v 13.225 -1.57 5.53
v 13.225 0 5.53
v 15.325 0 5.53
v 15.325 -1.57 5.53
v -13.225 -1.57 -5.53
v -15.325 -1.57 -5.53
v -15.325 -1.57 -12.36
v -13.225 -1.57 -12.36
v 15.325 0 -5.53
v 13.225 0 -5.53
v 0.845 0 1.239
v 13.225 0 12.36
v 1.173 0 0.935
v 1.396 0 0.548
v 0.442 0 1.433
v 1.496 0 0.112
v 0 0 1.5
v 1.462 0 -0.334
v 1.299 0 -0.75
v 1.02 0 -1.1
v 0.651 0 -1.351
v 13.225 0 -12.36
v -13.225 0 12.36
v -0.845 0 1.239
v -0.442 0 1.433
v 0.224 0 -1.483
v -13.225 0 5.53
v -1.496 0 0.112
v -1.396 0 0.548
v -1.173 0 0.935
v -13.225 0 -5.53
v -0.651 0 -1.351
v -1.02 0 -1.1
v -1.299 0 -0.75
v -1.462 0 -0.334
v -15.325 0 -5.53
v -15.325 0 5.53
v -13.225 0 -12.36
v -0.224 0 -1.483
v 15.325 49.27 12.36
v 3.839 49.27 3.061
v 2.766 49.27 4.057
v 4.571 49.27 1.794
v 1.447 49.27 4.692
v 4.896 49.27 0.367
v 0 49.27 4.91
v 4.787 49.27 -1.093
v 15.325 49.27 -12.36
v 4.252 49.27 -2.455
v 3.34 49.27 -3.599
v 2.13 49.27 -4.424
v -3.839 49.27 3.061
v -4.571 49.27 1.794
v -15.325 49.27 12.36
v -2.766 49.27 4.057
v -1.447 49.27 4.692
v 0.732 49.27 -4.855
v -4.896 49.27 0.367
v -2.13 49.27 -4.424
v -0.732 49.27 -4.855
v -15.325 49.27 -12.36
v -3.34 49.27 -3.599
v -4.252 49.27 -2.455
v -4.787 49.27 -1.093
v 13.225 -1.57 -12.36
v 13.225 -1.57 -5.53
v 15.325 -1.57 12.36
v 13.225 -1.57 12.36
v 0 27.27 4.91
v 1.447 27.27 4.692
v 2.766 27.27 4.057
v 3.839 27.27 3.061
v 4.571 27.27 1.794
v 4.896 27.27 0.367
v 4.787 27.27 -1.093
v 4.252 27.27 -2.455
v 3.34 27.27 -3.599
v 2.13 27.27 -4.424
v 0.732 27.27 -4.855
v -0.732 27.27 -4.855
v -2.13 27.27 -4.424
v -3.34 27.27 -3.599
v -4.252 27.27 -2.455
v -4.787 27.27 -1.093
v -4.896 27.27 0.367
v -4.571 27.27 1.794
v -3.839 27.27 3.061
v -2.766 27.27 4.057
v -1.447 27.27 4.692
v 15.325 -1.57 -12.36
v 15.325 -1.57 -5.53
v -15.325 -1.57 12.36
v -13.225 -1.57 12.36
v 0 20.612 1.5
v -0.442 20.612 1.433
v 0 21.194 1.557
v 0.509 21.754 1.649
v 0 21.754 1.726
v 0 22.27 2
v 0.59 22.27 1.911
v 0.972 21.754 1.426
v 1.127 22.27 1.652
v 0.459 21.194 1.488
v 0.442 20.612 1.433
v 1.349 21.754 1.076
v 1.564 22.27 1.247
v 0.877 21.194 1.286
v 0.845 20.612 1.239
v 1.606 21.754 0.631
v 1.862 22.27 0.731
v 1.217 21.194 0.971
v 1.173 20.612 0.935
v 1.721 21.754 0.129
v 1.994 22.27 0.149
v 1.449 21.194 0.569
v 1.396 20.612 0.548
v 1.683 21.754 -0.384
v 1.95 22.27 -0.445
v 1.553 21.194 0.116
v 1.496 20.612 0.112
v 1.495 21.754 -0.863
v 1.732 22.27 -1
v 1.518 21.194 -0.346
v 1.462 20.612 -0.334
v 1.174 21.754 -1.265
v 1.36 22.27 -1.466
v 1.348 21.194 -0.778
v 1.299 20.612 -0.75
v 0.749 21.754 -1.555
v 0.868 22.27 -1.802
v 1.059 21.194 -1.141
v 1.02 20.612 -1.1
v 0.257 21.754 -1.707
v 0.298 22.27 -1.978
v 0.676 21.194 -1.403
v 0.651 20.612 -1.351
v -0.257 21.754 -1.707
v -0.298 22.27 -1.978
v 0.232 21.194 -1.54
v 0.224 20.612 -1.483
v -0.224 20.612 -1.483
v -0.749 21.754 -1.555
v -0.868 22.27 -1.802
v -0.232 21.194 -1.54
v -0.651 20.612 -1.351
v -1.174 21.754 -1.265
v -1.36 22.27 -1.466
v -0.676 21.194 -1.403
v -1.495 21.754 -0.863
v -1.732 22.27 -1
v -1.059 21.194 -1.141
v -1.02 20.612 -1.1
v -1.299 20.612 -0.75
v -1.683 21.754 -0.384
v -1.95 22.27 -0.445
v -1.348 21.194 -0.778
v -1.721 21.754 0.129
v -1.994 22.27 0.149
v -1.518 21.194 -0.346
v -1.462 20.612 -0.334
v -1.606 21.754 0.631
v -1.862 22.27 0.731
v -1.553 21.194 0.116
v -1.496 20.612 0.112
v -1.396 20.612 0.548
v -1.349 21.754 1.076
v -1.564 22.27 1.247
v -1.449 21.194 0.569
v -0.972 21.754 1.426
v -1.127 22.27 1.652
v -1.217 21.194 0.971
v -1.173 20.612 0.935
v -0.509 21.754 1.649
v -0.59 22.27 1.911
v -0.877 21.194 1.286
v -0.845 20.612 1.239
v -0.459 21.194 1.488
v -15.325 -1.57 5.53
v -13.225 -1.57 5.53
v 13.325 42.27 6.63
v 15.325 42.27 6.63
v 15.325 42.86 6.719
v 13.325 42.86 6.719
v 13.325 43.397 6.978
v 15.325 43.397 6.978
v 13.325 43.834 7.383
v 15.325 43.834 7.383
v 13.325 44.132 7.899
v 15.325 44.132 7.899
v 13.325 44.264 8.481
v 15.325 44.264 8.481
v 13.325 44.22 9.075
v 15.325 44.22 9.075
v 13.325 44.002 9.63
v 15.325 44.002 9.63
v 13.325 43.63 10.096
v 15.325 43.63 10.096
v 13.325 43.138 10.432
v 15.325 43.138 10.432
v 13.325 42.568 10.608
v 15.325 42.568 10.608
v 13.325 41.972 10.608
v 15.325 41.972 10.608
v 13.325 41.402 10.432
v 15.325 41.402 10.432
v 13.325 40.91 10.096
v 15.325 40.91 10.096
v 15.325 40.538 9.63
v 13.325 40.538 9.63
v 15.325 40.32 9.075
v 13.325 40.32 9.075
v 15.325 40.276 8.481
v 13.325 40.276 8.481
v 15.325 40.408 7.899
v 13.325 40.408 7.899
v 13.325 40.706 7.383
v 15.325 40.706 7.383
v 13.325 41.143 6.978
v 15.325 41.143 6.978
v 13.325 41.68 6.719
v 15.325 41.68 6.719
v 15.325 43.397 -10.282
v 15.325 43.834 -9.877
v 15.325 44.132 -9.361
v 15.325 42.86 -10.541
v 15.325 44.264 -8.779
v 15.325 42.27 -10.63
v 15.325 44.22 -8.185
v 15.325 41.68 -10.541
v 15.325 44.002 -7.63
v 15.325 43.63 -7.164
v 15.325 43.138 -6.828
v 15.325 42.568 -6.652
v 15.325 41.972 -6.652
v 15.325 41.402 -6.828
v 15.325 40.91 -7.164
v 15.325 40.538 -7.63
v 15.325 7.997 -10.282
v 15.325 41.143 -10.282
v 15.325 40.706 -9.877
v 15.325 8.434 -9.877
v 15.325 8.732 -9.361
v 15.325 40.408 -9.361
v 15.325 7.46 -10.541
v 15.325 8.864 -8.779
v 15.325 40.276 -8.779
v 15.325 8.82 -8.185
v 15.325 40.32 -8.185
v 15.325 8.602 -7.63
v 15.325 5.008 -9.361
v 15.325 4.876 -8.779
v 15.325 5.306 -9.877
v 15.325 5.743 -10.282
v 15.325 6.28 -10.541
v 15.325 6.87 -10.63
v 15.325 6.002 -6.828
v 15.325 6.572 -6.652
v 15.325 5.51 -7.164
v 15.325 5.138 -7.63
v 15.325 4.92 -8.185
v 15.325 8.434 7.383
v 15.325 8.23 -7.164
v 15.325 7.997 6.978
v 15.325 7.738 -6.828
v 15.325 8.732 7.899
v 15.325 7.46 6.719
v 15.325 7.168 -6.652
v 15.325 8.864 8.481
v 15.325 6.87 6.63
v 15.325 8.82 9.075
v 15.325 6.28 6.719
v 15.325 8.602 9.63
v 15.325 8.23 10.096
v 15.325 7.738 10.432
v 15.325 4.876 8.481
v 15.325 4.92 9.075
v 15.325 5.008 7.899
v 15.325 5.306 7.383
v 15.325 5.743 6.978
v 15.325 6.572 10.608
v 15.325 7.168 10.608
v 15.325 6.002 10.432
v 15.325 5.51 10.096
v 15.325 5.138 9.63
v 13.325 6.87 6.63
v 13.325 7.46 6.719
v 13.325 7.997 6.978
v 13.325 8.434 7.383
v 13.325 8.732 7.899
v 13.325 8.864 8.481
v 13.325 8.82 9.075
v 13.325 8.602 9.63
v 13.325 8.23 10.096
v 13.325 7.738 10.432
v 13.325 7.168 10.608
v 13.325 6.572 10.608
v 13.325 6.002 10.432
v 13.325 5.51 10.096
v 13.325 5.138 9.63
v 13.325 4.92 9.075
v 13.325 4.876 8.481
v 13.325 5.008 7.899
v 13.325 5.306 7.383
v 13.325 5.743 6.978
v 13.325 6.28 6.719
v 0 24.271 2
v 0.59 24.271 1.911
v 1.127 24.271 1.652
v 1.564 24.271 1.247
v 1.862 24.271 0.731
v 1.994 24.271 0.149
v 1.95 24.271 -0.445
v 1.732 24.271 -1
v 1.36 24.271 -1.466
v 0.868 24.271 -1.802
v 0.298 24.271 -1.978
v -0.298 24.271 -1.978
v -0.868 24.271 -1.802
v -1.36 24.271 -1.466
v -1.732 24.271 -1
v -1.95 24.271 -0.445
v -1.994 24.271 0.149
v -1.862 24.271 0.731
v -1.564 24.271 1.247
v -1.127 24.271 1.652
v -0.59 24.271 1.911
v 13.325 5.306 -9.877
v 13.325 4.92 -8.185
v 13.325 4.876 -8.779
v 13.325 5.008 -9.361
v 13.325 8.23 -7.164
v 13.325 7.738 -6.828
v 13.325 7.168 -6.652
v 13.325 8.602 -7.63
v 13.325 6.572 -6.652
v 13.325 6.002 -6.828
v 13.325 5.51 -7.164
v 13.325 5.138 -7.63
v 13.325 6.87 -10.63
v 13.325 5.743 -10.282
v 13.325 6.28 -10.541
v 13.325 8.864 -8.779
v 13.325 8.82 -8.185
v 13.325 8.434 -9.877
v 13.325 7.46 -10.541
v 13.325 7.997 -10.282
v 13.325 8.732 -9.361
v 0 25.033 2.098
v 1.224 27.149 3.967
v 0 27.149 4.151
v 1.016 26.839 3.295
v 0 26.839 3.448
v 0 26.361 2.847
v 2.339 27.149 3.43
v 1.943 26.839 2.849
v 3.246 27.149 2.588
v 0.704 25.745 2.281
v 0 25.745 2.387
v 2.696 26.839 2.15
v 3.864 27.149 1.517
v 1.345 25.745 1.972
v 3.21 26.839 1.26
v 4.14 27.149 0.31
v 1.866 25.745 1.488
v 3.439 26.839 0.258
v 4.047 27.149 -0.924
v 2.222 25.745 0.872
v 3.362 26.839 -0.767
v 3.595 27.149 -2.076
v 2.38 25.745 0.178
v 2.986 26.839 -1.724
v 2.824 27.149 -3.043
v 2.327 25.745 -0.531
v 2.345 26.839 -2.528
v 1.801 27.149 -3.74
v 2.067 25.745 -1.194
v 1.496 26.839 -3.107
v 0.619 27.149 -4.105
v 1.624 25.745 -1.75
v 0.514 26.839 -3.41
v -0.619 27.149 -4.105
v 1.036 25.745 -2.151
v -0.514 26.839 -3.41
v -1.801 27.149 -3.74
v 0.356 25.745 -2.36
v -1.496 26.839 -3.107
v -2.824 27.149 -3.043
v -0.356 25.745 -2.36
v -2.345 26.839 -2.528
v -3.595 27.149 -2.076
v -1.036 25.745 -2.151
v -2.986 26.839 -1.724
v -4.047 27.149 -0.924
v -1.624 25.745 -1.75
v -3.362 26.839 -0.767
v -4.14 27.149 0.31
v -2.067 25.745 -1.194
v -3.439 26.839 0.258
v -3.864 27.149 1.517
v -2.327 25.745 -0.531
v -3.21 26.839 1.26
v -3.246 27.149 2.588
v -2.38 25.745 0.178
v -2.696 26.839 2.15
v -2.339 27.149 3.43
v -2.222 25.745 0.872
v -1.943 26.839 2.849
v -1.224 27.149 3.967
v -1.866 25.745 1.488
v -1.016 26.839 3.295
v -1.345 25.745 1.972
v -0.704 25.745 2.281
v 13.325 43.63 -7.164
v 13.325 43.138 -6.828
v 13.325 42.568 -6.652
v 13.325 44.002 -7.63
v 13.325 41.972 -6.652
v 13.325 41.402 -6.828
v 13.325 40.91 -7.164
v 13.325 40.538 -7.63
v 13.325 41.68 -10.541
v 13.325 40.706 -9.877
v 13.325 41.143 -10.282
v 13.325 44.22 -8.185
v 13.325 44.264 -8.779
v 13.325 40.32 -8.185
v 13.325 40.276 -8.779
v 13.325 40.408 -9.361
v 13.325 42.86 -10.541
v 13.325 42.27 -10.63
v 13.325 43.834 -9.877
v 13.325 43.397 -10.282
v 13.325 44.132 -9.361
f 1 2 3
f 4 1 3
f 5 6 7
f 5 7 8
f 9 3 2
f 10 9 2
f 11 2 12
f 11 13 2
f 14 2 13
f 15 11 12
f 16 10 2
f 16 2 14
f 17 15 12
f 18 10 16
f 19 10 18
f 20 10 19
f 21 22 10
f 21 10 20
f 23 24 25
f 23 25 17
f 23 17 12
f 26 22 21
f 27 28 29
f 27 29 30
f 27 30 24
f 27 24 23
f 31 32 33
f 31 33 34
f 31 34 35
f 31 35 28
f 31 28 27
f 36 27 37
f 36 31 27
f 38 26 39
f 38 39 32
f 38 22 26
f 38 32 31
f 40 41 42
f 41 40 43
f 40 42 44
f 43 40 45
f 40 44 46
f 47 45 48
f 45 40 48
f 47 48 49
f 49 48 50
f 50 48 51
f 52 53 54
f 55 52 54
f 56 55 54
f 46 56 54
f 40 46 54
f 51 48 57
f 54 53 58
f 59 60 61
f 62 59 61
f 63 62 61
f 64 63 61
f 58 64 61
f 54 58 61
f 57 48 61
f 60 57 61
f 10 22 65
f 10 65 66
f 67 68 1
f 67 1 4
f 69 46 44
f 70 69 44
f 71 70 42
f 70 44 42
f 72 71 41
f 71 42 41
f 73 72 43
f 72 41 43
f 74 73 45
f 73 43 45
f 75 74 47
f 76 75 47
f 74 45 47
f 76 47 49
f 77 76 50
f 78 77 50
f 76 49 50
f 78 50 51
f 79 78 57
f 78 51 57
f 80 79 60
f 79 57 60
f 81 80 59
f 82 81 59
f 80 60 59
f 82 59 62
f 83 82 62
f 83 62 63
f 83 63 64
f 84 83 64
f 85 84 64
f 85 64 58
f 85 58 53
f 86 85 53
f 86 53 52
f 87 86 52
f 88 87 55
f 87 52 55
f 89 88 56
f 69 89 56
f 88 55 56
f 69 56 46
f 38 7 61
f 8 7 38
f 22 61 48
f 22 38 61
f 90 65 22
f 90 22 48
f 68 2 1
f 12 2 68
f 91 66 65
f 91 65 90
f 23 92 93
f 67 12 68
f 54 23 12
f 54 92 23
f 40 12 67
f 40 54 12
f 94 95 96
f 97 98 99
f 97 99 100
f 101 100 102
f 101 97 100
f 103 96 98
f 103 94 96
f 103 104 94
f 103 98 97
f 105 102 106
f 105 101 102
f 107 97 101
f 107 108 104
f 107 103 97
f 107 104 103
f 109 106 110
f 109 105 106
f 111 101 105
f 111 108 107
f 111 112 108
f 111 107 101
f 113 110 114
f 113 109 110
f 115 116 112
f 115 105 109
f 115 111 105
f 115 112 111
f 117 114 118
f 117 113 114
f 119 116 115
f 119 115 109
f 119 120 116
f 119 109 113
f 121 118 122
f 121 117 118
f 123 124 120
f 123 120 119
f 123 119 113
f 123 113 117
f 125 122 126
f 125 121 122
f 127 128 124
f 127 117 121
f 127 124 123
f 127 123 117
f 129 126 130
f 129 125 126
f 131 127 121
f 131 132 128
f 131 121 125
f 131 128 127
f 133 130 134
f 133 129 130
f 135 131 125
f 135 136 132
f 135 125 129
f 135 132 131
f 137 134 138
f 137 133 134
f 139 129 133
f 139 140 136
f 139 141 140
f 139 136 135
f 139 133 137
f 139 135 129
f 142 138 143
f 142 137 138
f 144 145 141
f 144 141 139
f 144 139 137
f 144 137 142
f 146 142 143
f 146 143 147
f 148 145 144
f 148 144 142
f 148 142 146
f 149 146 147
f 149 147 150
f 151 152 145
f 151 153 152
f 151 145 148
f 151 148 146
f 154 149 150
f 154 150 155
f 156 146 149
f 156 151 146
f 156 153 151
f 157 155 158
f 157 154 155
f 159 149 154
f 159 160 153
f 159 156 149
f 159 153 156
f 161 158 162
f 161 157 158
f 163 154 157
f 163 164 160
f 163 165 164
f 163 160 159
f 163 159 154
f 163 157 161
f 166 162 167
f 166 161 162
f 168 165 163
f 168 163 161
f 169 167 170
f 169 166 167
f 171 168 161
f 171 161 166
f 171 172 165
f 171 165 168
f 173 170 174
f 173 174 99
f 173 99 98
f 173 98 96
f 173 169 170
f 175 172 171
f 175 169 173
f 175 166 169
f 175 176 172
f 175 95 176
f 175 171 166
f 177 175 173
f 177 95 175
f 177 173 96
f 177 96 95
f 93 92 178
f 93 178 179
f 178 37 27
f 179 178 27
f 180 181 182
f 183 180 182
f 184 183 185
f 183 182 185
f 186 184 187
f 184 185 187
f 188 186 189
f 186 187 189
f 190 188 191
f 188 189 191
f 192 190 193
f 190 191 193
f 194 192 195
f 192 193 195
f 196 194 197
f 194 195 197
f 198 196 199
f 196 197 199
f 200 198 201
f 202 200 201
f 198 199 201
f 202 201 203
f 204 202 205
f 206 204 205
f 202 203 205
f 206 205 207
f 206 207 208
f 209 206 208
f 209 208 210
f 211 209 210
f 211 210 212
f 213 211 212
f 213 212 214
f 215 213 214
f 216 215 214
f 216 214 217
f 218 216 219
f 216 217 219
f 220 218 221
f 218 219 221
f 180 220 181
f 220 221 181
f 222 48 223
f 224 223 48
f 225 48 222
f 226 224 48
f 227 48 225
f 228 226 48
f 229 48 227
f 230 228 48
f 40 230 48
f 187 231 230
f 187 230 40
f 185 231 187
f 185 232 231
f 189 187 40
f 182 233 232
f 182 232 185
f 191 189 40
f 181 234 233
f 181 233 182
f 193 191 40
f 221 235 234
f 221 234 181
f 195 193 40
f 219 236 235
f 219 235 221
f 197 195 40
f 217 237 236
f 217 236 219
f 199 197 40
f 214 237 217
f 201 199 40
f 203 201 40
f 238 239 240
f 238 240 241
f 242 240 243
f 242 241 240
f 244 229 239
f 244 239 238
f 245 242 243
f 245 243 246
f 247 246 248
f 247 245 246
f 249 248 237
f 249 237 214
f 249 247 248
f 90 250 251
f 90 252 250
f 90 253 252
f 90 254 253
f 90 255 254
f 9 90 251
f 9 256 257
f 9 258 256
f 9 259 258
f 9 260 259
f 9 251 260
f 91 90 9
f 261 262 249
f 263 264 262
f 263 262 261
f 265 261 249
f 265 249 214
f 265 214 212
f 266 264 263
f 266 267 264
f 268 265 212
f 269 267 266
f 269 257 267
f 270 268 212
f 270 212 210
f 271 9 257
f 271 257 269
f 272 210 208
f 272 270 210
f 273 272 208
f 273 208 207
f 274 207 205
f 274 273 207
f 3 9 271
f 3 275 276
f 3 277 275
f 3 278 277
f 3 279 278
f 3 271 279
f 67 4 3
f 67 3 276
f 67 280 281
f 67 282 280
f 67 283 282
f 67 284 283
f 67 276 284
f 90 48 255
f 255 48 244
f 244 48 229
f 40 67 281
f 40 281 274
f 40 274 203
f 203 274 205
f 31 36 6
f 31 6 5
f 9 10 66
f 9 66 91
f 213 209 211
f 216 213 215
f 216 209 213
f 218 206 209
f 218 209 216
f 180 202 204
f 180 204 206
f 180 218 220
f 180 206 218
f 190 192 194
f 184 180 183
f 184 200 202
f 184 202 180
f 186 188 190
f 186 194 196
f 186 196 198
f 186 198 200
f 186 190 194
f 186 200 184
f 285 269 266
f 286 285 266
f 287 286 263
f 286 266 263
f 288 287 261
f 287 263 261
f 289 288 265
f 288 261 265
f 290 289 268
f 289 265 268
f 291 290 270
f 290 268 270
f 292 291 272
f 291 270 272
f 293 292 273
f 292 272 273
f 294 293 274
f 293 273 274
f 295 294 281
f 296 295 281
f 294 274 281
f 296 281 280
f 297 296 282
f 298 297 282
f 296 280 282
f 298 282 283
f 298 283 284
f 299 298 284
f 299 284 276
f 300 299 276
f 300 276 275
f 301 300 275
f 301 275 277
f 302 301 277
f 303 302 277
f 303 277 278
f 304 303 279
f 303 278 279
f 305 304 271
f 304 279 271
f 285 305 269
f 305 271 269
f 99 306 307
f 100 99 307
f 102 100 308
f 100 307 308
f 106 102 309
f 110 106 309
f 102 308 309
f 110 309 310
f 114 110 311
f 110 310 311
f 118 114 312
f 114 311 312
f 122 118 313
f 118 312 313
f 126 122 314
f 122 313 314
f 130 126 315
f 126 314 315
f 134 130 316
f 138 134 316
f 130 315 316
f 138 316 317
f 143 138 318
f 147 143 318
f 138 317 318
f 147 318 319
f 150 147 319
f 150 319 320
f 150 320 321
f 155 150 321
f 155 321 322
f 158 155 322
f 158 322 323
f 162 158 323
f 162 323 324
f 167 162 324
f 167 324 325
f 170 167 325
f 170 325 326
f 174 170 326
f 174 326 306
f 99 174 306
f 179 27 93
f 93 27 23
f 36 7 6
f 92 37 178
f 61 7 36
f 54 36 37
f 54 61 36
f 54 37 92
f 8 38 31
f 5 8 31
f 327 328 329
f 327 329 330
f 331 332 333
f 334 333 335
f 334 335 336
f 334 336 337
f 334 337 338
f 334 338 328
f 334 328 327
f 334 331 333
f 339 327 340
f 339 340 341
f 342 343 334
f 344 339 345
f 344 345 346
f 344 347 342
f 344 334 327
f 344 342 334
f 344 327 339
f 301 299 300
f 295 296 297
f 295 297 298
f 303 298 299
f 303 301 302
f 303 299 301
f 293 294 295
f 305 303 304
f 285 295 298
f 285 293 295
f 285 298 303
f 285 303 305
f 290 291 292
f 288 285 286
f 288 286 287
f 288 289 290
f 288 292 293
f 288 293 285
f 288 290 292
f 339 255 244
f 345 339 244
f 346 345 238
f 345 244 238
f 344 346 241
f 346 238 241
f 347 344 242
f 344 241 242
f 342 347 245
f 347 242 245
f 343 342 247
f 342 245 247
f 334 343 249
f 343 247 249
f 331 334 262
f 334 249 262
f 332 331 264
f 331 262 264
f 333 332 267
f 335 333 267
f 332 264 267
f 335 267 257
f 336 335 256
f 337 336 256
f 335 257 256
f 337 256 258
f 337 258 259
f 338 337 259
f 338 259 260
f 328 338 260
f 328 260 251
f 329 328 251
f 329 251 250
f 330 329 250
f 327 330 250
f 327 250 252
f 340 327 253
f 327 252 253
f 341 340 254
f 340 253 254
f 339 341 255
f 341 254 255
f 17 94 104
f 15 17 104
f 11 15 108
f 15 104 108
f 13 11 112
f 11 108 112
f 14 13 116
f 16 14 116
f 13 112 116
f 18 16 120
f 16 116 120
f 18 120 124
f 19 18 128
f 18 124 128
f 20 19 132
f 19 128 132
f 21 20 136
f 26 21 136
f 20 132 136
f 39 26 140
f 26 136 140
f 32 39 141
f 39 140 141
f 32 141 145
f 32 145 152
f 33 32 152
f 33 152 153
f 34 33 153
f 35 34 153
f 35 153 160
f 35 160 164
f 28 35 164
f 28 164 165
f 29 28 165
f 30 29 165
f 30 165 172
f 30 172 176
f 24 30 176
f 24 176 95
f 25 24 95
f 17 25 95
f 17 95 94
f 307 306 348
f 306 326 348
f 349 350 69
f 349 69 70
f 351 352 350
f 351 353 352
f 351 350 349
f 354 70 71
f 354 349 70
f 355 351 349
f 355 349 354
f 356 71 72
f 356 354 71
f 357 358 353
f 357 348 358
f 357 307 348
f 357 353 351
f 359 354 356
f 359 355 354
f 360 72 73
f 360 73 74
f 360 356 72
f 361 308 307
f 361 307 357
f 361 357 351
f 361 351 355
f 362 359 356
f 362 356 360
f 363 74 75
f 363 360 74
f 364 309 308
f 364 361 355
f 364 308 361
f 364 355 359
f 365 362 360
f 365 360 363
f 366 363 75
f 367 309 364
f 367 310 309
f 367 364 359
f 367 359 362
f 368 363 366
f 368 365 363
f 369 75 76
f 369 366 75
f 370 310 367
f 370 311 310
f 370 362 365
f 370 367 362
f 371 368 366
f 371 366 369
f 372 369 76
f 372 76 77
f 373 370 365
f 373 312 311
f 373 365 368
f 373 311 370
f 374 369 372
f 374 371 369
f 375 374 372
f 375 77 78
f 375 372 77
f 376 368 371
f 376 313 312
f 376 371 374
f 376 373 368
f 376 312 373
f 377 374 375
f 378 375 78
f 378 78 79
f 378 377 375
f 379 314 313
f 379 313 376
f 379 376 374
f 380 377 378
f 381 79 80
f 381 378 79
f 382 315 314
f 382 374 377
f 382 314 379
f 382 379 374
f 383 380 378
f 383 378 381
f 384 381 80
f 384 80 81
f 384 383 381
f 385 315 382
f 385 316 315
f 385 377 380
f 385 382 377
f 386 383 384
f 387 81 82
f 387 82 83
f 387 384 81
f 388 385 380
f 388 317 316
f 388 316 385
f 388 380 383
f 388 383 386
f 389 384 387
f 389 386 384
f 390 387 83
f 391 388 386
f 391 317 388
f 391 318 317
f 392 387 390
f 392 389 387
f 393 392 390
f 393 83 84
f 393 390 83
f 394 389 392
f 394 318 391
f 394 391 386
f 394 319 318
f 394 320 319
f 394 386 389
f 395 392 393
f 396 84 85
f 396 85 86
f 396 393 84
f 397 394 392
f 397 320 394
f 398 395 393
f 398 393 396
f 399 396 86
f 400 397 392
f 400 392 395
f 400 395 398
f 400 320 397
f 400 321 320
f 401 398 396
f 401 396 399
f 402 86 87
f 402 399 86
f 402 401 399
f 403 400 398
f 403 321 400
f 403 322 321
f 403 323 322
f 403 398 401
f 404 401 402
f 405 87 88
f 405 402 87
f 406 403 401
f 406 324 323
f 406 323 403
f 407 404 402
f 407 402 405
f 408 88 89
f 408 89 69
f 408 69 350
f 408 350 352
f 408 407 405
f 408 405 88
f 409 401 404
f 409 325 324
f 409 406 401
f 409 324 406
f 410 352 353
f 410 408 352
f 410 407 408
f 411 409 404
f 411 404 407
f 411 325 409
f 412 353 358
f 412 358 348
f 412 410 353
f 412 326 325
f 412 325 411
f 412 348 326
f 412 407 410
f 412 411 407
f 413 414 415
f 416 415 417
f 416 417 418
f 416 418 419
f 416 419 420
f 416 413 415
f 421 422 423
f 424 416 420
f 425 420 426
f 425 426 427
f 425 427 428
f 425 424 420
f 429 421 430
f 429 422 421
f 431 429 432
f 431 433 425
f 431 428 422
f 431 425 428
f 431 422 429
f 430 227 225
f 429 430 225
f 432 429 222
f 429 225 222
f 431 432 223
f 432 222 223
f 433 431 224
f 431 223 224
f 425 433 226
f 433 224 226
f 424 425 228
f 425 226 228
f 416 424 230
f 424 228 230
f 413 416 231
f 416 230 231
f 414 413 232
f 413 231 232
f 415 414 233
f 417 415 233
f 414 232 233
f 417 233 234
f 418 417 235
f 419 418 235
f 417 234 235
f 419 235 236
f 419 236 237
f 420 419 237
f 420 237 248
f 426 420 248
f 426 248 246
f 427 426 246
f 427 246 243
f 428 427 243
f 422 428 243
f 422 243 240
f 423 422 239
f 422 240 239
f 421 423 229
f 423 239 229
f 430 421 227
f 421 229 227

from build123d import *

# Parameters (mm, degrees)
BOSS_EXTRUDE1_DEPTH = 49.27
SKETCH12_W          = 2.099999999999998
SKETCH12_H          = 6.83
SKETCH12_W_2        = 2.0999999999999996
SKETCH12_H_2        = 6.829999999999998
SKETCH12_W_3        = 2.1000000000000014
BOSS_EXTRUDE2_DEPTH = 1.57
SKETCH4_R           = 4.91
CUT_EXTRUDE3_DEPTH  = 22
SKETCH5_R           = 2
CUT_EXTRUDE4_DEPTH  = 5
SKETCH7_R           = 1.5
CUT_EXTRUDE5_DEPTH  = 34.41594267711148
FILLET4_R           = 3
FILLET5_R           = 3
SKETCH13_R          = 2.000000000000001
SKETCH13_R_2        = 2
SKETCH13_R_3        = 2.0000000000000004
SKETCH13_R_4        = 1.9999999999999996
CUT_EXTRUDE6_DEPTH  = 2


with BuildPart() as part:
    # Sketch2 → Boss-Extrude1 (new body)
    with BuildSketch(Plane(origin=(0, 0, 0), x_dir=(1, 0, 0), z_dir=(0, 1, 0))):
        Polygon((-15.325000000000001, 12.36), (15.324999999999998, 12.36), (15.325, -12.360000000000003), (-15.324999999999996, -12.360000000000003), align=None)
    extrude(amount=BOSS_EXTRUDE1_DEPTH)

    # Sketch12 → Boss-Extrude2 (add)
    with BuildSketch(Plane.XZ):
        with Locations((-14.274999999999997, 8.945000000000004)):
            Rectangle(SKETCH12_W, SKETCH12_H)
        with Locations((-14.275000000000002, -8.944999999999999)):
            Rectangle(SKETCH12_W_2, SKETCH12_H_2)
        with Locations((14.274999999999999, 8.945000000000004)):
            Rectangle(SKETCH12_W_3, SKETCH12_H)
        with Locations((14.274999999999999, -8.944999999999999)):
            Rectangle(SKETCH12_W_3, SKETCH12_H_2)
    extrude(amount=BOSS_EXTRUDE2_DEPTH)

    # Sketch4 → Cut-Extrude3 (cut)
    with BuildSketch(Plane(origin=(0, 49.27, 0), x_dir=(1, 0, 0), z_dir=(0, 1, 0))):
        with Locations(Location((0, 0, 0), (0, 0, 270))):
            Circle(SKETCH4_R)
    extrude(amount=-CUT_EXTRUDE3_DEPTH, mode=Mode.SUBTRACT)

    # Sketch5 → Cut-Extrude4 (cut)
    with BuildSketch(Plane(origin=(0, 27.270000000000003, 0), x_dir=(1, 0, 0), z_dir=(0, 1, 0))):
        with Locations(Location((0, 0, 0), (0, 0, 270))):
            Circle(SKETCH5_R)
    extrude(amount=-CUT_EXTRUDE4_DEPTH, mode=Mode.SUBTRACT)

    # Sketch7 → Cut-Extrude5 (cut, through all)
    with BuildSketch(Plane(origin=(0, 22.270000000000003, 0), x_dir=(1, 0, 0), z_dir=(0, 1, 0))):
        with Locations(Location((0, 0, 0), (0, 0, 270))):
            Circle(SKETCH7_R)
    extrude(amount=-CUT_EXTRUDE5_DEPTH, mode=Mode.SUBTRACT)

    # Fillet4
    # the kernel refuses this fillet: 3 mm, written as the material it takes off along each edge
    with BuildSketch(Plane(origin=(0, 27.270000000000003, 0), x_dir=(-1.8e-16, 0, 1), z_dir=(-1, 0, -1.8e-16))) as fillet4_piece_1:
        with BuildLine():
            CenterArc((5, -2.9986496961132367), FILLET4_R, 91.7191313208778, 88.2808686791222)
            Line((2, -2.9986496961132367), (1.94, -2.9986496961132367))
            Line((1.94, -2.9986496961132367), (1.94, 0))
            Line((1.94, 0), (2, 0.05999999999999872))
            ThreePointArc((2, 0.05999999999999872), (3.455, 0.05999999999999872), (4.9082, 0.05997299392226552))
            Line((4.9082, 0.05997299392226552), (4.91, 0))
        make_face()
    revolve(axis=Axis((0, 27.270000000000003, 0), (0, 1, 0)), mode=Mode.SUBTRACT)

    # Fillet5
    # the kernel refuses this fillet: 3 mm, written as the material it takes off along each edge
    with BuildSketch(Plane(origin=(0, 22.270000000000003, 0), x_dir=(-1.8e-16, 0, 1), z_dir=(-1, 0, -1.8e-16))) as fillet5_piece_1:
        with BuildLine():
            CenterArc((4.5, -1.6583123951831418), FILLET5_R, 146.44269023799268, 33.55730976200732)
            Line((2.0000000000025064, -1.66267e-12), (1.9500000000025566, 0.03316624790196698))
            ThreePointArc((1.9500000000025566, 0.03316624790196698), (1.7500000000012532, 0.05999999999999872), (1.5, 0.05999999999999872))
            Line((1.5, 0.05999999999999872), (1.44, 0))
            Line((1.44, 0), (1.44, -1.6583123951831418))
            Line((1.44, -1.6583123951831418), (1.5, -1.6583123951831418))
        make_face()
    revolve(axis=Axis((0, 22.270000000000003, 0), (0, 1, 0)), mode=Mode.SUBTRACT)

    # Sketch13 → Cut-Extrude6 (cut)
    with BuildSketch(Plane(origin=(15.324999999999998, 0, -1.08e-15), x_dir=(-7e-17, 0, -1), z_dir=(1, 0, -7e-17))):
        with Locations((-8.630000000000006, 42.27)):
            Circle(SKETCH13_R)
        with Locations((8.629999999999999, 42.27)):
            Circle(SKETCH13_R_2)
        with Locations((-8.630000000000006, 6.870000000000001)):
            Circle(SKETCH13_R_3)
        with Locations((8.629999999999999, 6.870000000000001)):
            Circle(SKETCH13_R_4)
    extrude(amount=-CUT_EXTRUDE6_DEPTH, mode=Mode.SUBTRACT)


solid = part.part
